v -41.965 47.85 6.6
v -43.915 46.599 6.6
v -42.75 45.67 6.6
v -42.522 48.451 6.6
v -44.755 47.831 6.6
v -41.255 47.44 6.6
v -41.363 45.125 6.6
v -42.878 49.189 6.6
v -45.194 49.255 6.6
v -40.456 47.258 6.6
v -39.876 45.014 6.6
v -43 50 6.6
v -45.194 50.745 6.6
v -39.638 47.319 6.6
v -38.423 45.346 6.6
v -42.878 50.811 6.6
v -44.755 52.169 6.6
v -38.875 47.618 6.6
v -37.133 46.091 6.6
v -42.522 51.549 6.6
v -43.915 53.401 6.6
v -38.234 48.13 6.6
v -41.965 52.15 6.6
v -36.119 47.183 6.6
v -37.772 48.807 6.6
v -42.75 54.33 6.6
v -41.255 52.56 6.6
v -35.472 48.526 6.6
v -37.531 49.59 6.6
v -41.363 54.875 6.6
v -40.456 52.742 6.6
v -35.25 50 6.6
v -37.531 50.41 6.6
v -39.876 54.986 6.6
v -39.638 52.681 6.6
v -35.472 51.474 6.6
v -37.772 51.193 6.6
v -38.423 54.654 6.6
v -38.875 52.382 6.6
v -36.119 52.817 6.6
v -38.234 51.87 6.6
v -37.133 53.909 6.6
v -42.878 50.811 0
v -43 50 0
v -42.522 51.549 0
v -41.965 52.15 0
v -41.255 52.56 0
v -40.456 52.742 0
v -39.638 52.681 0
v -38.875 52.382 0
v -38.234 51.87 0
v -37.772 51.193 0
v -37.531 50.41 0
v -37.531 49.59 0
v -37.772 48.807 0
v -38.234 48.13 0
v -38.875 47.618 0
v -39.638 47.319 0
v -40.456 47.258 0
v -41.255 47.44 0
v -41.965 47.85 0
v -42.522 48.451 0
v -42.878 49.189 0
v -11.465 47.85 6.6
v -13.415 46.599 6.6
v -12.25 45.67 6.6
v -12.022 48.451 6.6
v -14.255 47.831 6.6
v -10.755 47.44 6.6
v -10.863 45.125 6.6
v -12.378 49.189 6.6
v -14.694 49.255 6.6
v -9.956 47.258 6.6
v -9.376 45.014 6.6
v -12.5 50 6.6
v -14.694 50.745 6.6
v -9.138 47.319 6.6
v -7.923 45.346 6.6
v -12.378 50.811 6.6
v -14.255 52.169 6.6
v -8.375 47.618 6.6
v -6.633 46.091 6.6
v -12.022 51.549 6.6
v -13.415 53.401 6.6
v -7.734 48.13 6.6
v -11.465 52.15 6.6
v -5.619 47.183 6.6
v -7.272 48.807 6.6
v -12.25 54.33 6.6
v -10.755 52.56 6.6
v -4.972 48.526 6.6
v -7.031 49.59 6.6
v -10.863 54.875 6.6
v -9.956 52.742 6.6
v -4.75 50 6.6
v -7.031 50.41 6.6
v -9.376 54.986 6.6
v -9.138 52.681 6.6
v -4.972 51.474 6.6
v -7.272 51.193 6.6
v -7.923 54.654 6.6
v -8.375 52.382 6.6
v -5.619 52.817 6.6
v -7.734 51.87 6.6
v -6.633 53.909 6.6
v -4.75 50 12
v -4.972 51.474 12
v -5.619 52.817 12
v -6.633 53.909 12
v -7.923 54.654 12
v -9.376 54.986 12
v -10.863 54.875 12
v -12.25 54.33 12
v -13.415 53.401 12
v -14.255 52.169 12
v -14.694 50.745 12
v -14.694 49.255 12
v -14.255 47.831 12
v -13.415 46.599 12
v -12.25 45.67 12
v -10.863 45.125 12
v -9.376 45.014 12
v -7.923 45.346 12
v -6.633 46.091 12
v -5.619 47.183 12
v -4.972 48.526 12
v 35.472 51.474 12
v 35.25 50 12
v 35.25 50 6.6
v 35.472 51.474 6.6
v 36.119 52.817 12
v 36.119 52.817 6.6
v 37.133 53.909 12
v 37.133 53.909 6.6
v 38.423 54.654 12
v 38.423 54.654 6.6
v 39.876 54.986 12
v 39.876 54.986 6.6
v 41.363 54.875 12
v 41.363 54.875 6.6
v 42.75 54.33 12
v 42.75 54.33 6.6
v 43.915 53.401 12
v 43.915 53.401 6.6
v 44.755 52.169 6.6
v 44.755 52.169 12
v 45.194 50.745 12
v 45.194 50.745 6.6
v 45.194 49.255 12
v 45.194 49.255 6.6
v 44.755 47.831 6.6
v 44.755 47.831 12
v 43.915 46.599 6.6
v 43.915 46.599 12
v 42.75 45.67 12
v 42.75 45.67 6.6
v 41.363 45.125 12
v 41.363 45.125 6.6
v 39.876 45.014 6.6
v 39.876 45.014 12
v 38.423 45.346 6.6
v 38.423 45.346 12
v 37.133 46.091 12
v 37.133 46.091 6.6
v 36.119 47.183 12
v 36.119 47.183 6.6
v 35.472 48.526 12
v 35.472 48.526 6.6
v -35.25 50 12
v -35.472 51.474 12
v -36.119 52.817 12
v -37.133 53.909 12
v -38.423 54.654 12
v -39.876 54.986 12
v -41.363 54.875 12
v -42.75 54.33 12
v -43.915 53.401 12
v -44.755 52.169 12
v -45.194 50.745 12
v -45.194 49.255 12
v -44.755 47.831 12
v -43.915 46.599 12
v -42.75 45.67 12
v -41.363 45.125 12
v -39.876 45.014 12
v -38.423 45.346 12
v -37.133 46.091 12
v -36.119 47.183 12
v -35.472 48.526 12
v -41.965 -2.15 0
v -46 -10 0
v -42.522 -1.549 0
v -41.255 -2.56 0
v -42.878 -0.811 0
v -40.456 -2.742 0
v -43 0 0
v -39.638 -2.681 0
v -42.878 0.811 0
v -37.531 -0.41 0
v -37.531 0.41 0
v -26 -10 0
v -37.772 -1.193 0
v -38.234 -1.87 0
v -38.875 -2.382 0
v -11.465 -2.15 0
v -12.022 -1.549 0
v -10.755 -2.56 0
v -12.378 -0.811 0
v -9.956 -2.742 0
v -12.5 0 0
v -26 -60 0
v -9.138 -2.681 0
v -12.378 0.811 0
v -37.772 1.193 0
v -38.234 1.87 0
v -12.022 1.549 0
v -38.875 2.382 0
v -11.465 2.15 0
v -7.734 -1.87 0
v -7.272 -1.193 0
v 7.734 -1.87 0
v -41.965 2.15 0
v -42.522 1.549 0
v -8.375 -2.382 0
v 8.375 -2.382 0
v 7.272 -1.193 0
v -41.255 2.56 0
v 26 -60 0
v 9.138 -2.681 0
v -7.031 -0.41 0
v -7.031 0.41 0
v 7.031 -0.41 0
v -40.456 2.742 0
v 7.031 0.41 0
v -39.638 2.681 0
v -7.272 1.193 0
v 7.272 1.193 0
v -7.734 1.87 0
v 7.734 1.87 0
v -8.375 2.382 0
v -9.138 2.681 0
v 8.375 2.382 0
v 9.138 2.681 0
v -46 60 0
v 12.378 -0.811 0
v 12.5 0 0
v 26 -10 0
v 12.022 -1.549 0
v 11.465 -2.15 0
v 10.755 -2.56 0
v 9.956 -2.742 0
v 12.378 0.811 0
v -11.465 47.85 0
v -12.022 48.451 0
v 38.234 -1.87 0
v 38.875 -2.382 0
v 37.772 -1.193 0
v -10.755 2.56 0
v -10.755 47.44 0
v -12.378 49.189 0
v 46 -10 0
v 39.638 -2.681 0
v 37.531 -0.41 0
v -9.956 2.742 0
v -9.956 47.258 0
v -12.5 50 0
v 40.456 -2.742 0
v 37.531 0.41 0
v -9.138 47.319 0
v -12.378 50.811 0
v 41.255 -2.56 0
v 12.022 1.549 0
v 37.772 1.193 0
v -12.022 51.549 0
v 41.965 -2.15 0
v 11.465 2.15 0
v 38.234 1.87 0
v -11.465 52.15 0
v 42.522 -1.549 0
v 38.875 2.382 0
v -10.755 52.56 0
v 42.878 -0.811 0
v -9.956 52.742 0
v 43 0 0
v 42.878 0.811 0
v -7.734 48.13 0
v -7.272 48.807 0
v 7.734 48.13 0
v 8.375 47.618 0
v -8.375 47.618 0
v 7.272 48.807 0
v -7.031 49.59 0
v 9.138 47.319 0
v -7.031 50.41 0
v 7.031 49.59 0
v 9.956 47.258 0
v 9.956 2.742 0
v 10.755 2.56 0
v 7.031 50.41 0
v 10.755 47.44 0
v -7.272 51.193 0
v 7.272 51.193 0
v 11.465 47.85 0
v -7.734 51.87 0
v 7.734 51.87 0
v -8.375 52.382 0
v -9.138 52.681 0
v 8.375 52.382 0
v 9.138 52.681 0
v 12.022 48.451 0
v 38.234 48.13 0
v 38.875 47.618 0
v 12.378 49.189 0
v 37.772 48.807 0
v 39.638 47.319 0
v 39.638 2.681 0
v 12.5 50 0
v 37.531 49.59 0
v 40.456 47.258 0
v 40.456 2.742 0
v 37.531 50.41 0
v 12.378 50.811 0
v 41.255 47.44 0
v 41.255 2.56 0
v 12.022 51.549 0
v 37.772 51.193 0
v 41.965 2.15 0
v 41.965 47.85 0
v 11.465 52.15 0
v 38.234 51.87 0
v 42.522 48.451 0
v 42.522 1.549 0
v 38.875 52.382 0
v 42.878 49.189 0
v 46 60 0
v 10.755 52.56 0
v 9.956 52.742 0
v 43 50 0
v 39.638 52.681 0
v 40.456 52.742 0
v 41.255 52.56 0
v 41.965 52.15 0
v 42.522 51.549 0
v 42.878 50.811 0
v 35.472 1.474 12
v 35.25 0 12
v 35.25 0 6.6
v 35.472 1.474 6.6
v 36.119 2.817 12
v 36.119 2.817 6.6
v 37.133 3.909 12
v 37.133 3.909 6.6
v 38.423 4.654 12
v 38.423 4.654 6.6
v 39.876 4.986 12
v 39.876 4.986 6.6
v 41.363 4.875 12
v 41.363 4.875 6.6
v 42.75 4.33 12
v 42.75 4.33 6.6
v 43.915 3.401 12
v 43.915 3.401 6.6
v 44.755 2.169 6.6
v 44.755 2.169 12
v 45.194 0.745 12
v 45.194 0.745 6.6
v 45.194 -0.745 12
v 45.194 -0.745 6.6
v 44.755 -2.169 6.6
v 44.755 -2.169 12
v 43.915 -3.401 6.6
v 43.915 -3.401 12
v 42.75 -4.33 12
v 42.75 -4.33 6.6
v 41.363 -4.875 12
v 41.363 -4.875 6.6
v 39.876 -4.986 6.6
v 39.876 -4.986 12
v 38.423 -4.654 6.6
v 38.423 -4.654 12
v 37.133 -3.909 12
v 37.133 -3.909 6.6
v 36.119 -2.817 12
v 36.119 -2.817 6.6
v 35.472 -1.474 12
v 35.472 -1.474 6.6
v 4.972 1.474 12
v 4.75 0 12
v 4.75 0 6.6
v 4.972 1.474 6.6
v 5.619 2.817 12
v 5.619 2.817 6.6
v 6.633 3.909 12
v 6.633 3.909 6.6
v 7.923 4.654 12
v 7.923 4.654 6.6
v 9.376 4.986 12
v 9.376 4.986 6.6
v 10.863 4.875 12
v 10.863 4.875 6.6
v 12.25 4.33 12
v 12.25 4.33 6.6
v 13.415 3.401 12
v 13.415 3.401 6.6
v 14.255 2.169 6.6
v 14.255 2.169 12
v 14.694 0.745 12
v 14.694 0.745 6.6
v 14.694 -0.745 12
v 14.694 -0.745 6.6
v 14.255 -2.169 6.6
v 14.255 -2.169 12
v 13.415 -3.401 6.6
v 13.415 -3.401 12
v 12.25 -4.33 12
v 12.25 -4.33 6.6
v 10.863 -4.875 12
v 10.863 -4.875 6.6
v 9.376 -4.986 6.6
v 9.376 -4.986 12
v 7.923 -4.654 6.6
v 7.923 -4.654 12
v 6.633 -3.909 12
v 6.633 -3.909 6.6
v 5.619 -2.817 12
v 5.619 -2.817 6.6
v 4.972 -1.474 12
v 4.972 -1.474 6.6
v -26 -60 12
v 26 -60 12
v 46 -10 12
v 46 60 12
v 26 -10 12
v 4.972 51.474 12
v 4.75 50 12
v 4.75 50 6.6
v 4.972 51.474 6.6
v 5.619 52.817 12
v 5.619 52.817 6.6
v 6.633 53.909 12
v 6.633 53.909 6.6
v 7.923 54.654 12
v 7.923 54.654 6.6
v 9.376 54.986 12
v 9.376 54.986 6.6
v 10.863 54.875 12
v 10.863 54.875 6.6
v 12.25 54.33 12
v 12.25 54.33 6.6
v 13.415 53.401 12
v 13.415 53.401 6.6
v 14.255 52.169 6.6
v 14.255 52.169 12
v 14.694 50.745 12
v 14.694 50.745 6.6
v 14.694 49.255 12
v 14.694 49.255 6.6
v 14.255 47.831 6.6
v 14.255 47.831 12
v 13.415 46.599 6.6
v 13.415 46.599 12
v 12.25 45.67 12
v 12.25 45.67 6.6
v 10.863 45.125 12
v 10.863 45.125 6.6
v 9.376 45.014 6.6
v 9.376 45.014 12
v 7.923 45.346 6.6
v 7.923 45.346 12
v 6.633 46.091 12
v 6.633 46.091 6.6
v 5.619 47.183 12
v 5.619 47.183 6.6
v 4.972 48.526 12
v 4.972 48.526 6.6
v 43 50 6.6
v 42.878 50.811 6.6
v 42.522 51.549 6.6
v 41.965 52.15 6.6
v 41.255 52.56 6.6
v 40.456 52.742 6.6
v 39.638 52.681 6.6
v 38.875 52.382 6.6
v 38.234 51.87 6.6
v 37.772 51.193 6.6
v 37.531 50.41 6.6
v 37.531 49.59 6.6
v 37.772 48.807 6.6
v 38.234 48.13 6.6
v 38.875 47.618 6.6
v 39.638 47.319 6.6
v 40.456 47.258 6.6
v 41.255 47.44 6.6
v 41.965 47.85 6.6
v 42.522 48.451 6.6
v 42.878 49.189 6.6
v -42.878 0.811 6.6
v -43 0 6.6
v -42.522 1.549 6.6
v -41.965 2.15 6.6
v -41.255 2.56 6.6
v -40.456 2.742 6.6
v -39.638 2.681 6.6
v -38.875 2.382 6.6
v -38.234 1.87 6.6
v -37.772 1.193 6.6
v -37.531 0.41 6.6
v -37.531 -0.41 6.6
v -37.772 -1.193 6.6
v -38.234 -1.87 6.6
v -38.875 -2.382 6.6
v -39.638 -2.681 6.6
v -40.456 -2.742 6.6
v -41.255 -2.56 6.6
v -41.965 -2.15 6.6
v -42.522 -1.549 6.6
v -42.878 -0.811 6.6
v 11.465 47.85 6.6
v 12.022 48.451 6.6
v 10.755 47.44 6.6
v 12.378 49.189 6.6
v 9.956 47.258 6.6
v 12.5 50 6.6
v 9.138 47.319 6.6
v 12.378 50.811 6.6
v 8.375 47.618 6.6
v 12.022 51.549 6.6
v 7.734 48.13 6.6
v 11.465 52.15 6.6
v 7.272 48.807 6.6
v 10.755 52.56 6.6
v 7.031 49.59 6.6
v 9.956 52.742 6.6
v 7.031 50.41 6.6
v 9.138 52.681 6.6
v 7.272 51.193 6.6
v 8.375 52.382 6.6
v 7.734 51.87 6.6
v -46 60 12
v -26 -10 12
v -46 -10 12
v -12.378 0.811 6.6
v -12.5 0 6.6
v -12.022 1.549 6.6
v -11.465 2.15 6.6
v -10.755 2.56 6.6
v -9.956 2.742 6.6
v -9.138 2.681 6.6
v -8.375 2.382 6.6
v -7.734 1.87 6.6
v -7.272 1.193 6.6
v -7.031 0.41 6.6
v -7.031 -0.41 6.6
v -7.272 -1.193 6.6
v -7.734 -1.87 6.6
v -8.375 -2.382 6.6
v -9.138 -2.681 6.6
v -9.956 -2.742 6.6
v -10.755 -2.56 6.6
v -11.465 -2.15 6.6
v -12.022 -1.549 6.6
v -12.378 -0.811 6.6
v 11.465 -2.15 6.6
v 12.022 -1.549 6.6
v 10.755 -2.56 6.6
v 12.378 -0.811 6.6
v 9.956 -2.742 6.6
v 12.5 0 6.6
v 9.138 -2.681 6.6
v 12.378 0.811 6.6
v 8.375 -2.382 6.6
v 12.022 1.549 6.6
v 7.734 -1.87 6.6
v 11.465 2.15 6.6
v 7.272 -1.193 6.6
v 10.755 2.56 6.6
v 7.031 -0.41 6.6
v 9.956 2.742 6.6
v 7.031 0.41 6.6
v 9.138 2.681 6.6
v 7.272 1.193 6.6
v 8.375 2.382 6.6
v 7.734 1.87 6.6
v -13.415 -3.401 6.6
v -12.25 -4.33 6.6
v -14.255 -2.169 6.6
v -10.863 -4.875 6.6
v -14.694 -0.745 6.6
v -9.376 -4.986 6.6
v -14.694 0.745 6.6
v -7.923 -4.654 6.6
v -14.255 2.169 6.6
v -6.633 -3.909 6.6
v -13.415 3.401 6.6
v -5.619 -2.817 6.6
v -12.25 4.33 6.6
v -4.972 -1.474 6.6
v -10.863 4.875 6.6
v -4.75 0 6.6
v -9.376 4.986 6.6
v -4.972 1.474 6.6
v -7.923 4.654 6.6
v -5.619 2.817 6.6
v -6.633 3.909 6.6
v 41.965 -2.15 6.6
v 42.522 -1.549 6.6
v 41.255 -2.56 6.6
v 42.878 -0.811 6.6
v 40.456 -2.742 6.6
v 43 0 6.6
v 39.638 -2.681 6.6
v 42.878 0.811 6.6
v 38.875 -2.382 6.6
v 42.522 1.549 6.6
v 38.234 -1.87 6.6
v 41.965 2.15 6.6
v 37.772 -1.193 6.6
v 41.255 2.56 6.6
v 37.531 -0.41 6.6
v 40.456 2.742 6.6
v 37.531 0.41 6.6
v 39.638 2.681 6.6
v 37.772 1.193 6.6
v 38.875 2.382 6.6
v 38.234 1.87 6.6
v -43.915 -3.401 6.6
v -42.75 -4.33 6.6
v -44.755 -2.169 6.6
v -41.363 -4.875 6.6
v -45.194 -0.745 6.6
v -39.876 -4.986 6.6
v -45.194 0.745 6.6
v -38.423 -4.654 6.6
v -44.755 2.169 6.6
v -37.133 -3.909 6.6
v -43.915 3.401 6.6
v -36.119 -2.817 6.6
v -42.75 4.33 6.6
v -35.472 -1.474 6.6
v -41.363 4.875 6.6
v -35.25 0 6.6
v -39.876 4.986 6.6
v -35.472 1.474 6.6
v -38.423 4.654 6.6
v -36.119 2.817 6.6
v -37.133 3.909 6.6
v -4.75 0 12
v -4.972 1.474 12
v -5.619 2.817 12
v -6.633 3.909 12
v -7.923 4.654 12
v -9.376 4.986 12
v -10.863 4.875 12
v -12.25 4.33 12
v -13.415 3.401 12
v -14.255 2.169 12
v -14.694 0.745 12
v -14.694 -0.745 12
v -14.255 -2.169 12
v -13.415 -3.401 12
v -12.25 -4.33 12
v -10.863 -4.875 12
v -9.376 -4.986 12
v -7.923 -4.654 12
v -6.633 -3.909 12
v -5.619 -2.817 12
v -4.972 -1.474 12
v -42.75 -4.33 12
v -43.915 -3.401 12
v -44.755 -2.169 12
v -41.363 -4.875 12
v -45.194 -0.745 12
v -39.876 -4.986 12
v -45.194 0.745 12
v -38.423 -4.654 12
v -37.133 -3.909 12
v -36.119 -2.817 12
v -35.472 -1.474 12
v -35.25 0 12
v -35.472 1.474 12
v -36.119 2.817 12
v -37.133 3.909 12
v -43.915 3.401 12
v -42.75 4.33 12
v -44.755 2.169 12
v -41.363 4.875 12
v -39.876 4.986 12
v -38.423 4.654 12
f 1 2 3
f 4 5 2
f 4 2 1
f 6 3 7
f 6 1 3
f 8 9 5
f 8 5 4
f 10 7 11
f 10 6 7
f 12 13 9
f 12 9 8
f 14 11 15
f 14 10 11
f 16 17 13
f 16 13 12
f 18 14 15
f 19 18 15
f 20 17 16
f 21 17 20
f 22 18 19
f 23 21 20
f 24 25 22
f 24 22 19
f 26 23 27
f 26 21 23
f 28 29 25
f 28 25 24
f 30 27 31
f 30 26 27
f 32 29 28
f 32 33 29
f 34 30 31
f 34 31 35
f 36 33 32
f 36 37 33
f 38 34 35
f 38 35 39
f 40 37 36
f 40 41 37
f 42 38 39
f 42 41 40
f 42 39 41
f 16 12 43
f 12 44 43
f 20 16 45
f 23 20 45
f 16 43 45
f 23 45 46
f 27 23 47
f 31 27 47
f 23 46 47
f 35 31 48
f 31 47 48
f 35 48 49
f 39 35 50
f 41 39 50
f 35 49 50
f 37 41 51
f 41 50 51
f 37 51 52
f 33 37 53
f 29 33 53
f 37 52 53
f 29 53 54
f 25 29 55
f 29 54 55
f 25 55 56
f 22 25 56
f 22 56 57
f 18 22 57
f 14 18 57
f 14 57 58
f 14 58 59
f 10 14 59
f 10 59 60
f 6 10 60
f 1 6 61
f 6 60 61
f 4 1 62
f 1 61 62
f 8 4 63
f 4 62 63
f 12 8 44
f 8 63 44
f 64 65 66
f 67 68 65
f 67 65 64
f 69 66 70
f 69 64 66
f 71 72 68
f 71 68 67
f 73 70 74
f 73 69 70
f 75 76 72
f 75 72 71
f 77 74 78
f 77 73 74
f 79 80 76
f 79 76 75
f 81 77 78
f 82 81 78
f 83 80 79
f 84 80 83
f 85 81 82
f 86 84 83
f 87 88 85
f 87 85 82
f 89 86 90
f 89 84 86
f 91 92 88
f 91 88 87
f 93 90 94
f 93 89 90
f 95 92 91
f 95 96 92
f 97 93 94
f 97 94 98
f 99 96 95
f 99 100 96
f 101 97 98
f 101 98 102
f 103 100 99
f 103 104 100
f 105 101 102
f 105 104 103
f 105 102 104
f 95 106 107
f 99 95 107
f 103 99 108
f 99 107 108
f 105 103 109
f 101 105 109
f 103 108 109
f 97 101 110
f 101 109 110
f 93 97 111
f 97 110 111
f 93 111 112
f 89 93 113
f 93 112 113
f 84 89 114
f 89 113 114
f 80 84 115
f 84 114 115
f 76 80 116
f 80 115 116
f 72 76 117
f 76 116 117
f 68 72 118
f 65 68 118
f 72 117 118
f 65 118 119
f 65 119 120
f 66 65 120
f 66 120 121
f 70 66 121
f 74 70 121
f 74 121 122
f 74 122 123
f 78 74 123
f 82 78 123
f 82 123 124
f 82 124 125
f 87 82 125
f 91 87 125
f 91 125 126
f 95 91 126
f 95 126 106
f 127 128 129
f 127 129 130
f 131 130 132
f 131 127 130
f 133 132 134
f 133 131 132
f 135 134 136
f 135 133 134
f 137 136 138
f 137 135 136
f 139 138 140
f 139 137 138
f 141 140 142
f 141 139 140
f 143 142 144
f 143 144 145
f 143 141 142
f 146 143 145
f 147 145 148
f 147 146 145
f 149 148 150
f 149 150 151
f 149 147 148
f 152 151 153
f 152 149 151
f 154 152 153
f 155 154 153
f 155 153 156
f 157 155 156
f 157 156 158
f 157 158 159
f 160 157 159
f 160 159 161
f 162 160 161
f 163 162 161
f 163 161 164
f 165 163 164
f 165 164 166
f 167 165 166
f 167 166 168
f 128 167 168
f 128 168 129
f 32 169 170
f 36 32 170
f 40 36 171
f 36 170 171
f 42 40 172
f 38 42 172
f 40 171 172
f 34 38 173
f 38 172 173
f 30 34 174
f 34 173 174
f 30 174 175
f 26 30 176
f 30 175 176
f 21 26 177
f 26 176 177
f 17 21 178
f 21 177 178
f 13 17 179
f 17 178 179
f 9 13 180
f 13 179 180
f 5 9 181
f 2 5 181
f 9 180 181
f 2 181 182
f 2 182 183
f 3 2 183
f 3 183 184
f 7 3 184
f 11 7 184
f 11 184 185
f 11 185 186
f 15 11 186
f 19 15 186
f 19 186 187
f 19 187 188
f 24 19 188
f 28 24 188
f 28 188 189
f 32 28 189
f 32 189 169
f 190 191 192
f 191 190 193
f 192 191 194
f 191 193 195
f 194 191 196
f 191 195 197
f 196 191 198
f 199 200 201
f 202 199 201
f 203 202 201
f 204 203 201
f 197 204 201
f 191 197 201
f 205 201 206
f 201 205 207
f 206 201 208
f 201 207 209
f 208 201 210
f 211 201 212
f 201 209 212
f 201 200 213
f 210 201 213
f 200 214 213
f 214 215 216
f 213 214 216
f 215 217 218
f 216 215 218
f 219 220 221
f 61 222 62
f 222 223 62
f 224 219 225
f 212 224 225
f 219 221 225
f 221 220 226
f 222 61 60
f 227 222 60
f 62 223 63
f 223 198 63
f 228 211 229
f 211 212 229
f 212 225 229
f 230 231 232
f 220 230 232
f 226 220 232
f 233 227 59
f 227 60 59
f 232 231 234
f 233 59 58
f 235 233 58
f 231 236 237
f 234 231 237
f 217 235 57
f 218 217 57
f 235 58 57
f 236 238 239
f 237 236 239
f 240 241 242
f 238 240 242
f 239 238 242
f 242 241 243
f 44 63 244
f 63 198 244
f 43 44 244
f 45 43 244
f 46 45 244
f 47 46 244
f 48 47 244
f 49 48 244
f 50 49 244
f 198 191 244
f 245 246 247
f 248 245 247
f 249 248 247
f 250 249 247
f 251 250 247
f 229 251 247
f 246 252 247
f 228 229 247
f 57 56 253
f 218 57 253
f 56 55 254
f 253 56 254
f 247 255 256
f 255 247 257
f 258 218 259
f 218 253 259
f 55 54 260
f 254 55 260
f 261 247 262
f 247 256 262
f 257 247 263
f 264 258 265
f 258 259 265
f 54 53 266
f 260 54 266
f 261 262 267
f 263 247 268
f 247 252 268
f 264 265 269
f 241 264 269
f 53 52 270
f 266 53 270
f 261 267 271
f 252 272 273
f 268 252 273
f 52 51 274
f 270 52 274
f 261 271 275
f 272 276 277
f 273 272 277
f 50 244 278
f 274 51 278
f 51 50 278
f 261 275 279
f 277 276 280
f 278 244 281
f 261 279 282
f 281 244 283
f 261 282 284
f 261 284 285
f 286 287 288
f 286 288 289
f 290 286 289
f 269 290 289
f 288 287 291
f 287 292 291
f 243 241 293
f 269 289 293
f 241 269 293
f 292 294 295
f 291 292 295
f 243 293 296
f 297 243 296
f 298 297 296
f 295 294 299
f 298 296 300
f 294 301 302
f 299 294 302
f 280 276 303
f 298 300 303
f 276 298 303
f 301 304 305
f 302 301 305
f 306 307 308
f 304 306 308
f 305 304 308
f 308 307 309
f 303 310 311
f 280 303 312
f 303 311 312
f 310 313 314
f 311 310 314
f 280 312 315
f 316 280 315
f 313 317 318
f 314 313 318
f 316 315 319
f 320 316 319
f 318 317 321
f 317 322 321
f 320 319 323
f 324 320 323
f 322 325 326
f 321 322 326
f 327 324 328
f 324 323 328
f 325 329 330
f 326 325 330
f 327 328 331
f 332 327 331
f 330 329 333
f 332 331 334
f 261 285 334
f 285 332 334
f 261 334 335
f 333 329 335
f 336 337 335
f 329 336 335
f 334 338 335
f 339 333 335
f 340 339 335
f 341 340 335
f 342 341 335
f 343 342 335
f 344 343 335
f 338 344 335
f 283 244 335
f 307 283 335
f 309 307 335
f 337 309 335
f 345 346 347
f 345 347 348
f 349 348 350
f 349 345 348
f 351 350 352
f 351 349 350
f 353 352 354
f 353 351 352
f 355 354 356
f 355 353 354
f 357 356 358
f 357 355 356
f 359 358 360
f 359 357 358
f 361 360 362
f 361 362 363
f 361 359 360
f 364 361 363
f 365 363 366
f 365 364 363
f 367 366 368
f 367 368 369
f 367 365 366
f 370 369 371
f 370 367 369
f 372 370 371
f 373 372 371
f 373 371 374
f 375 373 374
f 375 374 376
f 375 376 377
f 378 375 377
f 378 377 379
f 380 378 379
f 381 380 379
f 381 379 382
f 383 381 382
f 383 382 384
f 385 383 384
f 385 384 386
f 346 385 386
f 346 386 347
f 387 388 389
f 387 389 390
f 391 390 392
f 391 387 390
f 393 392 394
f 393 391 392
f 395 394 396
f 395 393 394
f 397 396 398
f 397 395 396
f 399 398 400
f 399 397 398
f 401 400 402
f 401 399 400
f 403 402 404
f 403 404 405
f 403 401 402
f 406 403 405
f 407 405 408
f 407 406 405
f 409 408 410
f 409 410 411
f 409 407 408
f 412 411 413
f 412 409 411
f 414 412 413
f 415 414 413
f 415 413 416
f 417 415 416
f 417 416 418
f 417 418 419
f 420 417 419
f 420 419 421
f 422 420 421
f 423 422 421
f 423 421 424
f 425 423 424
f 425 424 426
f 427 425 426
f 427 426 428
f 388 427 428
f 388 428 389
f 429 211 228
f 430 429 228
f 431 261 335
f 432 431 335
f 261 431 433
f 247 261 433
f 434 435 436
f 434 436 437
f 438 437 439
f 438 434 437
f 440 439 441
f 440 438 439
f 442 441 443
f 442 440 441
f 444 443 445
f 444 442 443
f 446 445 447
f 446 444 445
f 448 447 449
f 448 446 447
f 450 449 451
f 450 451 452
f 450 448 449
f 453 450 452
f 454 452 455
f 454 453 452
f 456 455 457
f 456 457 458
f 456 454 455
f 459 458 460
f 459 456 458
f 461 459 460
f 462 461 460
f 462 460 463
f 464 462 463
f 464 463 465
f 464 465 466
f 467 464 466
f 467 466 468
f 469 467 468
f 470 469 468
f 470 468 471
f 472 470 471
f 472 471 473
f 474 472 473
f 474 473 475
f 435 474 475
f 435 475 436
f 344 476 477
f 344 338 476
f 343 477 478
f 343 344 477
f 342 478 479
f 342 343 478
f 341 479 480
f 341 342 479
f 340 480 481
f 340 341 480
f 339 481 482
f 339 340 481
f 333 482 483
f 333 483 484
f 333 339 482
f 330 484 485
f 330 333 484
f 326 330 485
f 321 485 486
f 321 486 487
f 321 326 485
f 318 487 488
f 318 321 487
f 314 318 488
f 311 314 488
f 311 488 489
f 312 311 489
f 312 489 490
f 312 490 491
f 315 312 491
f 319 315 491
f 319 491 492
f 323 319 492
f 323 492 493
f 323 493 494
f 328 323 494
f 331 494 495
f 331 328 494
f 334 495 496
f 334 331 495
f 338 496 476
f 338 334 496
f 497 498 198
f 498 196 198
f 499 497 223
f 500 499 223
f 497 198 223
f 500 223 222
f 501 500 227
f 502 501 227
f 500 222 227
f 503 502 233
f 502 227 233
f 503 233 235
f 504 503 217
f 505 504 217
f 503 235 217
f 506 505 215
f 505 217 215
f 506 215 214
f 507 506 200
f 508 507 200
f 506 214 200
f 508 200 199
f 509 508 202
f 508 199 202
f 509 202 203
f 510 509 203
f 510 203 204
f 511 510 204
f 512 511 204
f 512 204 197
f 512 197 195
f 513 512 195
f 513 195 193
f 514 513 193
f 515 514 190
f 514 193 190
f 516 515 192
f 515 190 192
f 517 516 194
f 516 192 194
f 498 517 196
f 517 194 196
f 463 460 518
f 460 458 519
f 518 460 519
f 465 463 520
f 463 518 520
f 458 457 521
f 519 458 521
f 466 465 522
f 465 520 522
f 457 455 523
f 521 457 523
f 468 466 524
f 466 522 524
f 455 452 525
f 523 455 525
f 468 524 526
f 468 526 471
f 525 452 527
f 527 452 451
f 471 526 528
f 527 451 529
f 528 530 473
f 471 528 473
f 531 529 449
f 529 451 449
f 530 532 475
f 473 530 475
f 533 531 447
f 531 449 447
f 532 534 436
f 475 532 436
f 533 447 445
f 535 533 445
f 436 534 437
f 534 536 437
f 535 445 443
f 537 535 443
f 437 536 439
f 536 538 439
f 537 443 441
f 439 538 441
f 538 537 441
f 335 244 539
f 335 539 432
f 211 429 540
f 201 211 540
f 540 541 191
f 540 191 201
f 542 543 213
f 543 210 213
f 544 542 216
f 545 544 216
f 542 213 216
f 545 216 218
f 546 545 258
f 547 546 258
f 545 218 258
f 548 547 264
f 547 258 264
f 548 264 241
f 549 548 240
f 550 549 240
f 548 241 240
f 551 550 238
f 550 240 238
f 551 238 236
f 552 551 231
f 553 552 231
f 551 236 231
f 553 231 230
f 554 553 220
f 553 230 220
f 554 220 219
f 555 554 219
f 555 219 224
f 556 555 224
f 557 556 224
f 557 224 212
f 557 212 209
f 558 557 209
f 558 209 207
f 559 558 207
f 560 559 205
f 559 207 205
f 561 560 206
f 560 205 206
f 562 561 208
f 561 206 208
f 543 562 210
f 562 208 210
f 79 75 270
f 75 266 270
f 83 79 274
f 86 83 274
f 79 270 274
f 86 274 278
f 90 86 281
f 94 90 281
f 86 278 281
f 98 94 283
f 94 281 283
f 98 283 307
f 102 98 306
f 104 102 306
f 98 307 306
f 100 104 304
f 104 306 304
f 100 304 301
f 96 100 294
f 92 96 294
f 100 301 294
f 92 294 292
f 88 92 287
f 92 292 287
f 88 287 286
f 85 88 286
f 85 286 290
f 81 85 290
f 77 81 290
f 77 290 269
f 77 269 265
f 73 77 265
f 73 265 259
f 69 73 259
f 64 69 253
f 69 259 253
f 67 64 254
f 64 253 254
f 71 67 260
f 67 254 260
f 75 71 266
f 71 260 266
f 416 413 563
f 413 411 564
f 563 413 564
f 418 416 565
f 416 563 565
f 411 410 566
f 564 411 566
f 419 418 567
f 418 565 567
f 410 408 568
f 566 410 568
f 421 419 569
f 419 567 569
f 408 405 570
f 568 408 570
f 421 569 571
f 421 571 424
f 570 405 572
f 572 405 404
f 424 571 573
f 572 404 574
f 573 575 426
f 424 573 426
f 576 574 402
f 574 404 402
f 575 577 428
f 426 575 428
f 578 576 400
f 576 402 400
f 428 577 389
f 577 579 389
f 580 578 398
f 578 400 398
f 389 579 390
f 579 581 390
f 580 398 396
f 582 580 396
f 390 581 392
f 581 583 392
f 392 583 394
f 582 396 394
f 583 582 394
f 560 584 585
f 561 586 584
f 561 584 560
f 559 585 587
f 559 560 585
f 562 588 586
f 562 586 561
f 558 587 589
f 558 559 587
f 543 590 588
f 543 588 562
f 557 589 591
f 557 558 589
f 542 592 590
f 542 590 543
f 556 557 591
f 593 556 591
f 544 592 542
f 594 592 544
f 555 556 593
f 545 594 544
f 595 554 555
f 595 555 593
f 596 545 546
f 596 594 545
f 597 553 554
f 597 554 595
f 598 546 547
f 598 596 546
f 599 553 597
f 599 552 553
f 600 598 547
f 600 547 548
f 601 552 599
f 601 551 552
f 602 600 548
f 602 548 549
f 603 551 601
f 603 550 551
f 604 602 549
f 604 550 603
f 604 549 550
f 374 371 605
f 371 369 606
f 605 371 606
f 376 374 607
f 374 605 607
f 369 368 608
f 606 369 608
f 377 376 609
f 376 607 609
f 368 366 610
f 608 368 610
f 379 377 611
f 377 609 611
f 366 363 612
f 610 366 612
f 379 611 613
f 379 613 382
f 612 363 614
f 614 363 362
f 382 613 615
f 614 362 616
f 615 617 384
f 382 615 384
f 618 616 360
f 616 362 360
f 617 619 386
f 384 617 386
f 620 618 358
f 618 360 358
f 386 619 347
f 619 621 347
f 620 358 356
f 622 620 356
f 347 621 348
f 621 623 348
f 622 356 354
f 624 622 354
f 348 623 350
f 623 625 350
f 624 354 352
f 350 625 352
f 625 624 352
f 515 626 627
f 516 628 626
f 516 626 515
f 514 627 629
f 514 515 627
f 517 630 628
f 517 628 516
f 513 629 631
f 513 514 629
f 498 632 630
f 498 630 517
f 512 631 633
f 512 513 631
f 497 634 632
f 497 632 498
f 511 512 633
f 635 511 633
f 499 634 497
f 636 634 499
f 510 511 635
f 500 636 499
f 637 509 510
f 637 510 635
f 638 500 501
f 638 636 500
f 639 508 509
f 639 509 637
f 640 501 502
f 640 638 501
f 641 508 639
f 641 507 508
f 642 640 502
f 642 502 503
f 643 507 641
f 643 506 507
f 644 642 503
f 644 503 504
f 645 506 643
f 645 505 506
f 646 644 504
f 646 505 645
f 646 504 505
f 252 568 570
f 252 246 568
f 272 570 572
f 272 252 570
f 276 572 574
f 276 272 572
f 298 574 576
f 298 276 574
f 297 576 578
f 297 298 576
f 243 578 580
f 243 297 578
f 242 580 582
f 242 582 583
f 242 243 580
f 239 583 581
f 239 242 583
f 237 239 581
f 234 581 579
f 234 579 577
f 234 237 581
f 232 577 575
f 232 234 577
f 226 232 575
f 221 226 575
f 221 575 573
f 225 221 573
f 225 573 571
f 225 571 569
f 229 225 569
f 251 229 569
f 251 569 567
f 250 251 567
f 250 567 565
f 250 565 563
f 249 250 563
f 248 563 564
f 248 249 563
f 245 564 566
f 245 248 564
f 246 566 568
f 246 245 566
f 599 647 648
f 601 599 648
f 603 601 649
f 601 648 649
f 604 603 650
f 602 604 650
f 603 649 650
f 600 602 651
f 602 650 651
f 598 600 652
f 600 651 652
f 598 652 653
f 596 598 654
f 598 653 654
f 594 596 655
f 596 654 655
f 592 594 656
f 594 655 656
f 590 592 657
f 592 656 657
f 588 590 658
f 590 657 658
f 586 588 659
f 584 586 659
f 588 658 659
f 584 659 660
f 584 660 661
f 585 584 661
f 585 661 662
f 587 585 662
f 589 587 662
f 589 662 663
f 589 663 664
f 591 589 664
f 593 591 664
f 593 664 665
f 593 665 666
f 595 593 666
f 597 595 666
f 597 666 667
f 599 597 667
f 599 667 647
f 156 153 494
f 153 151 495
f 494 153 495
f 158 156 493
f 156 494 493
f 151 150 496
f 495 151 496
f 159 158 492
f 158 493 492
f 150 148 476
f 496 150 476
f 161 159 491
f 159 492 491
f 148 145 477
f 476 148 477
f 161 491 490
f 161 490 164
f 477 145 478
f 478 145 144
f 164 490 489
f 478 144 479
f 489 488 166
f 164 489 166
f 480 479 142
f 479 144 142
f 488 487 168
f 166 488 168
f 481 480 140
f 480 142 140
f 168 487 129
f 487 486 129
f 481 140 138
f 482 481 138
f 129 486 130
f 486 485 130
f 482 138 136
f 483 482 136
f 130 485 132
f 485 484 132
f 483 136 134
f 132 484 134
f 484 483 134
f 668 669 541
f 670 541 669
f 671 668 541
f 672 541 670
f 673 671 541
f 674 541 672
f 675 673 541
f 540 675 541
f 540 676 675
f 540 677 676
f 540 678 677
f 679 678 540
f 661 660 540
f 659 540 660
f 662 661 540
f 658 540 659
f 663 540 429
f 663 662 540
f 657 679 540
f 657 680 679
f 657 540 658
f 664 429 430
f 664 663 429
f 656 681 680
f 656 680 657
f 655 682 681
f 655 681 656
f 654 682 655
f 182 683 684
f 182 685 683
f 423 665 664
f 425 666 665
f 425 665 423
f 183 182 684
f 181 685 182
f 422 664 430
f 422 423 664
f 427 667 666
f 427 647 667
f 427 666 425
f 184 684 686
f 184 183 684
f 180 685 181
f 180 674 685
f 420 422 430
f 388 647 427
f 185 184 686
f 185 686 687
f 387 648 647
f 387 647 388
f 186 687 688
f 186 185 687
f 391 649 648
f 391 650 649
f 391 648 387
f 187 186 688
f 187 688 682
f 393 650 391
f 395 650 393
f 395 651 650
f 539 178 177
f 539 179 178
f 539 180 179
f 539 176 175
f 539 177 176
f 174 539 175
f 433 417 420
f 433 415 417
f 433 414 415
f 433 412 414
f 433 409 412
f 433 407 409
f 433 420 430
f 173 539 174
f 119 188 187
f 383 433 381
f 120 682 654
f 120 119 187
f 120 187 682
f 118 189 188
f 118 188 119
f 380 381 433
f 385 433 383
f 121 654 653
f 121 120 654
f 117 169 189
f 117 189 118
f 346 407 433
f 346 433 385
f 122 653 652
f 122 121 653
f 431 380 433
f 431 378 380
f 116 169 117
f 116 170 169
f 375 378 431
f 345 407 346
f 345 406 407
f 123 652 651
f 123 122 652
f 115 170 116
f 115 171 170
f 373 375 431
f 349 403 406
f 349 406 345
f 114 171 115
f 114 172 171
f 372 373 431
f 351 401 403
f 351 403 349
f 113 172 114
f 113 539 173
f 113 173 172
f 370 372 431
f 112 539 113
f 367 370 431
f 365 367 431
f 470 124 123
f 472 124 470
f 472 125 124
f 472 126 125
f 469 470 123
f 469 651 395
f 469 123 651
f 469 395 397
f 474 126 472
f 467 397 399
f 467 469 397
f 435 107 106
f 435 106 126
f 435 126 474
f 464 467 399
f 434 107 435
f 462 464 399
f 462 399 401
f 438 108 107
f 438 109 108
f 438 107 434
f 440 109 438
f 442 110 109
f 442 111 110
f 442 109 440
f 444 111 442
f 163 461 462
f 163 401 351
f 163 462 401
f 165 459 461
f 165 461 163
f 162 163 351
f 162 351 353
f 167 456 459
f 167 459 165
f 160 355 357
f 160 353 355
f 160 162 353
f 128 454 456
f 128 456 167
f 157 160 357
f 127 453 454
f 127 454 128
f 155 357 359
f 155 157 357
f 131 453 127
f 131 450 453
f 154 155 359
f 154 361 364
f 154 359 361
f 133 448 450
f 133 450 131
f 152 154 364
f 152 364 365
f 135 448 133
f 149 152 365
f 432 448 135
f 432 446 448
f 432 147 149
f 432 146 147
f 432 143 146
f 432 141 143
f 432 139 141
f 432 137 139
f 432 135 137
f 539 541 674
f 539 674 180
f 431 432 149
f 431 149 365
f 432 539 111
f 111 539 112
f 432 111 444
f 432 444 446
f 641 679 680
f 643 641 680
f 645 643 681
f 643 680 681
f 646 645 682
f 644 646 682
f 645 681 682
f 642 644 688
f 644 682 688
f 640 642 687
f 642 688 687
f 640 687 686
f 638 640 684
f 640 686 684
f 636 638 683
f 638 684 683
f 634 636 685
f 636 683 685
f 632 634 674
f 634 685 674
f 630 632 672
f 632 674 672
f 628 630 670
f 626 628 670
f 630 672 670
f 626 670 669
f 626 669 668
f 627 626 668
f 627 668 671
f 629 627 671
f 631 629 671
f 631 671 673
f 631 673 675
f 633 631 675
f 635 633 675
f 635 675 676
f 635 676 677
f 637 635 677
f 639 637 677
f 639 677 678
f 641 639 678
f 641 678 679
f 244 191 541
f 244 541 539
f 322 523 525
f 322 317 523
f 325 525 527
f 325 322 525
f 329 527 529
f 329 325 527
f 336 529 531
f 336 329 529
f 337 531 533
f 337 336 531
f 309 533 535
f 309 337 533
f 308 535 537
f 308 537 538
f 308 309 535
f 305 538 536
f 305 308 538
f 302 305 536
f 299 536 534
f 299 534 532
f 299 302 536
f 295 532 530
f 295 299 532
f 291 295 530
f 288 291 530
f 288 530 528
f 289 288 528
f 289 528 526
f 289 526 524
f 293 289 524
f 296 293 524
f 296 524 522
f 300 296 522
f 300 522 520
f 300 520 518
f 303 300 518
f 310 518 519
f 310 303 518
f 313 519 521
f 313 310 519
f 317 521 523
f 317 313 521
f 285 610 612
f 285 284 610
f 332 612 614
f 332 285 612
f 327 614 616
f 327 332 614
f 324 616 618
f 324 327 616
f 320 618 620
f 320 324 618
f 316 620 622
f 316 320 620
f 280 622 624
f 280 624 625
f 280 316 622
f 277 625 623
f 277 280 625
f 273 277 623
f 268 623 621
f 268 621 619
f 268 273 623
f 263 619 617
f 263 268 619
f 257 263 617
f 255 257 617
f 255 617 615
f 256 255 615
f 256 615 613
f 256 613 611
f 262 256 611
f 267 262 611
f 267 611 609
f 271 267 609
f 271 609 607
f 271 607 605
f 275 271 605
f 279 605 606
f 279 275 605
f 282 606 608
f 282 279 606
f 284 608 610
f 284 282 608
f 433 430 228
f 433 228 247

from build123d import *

# Parameters (mm, degrees)
SKETCH1_W                                           = 92
SKETCH1_H                                           = 120
BOSS_EXTRUDE1_DEPTH                                 = 12
CBORE_FOR_M5_HEX_SOCKET_HEAD_CAP_SCREW1_D           = 5.5
CBORE_FOR_M5_HEX_SOCKET_HEAD_CAP_SCREW1_CBORE_D     = 10
CBORE_FOR_M5_HEX_SOCKET_HEAD_CAP_SCREW1_CBORE_DEPTH = 5.4
CUT_EXTRUDE1_REACH                                  = 78.551
SKETCH4_W                                           = 20
SKETCH4_H                                           = 50


with BuildPart() as part:
    # Sketch1 → Boss-Extrude1 (new body)
    with BuildSketch(Plane.XY):
        Rectangle(SKETCH1_W, SKETCH1_H)
    extrude(amount=BOSS_EXTRUDE1_DEPTH)

    # CBORE for M5 Hex Socket Head Cap Screw1 (through all)
    with Locations(Plane.XY.offset(12)):
        with Locations((-40.25, 50), (-9.75, 50), (-9.75, 0), (-40.25, 0)):
            cbore_for_m5_hex_socket_head_cap_screw1 = CounterBoreHole(CBORE_FOR_M5_HEX_SOCKET_HEAD_CAP_SCREW1_D / 2, CBORE_FOR_M5_HEX_SOCKET_HEAD_CAP_SCREW1_CBORE_D / 2, CBORE_FOR_M5_HEX_SOCKET_HEAD_CAP_SCREW1_CBORE_DEPTH)

    # Mirror1: CBORE for M5 Hex Socket Head Cap Screw1 across plane
    add(cbore_for_m5_hex_socket_head_cap_screw1.mirror(Plane(origin=(0, 0, 0), x_dir=(0, 0, 1), z_dir=(1, 0, 0))), mode=Mode.SUBTRACT)

    # Sketch4 → Cut-Extrude1 (cut, up to next)
    with BuildSketch(Plane.XY.offset(12), mode=Mode.PRIVATE) as cut_extrude1_sk1:
        with Locations((-36, -35)):
            Rectangle(SKETCH4_W, SKETCH4_H)
    cut_extrude1_tool1 = extrude(cut_extrude1_sk1.sketch, amount=-CUT_EXTRUDE1_REACH, mode=Mode.PRIVATE) & part.part
    cut_extrude1 = cut_extrude1_tool1.solids().sort_by_distance((-36, -35, 12))[0]
    add(cut_extrude1, mode=Mode.SUBTRACT)

    # Mirror2: Cut-Extrude1 across plane
    add(cut_extrude1.mirror(Plane(origin=(0, 0, 0), x_dir=(0, 0, 1), z_dir=(1, 0, 0))), mode=Mode.SUBTRACT)


solid = part.part
